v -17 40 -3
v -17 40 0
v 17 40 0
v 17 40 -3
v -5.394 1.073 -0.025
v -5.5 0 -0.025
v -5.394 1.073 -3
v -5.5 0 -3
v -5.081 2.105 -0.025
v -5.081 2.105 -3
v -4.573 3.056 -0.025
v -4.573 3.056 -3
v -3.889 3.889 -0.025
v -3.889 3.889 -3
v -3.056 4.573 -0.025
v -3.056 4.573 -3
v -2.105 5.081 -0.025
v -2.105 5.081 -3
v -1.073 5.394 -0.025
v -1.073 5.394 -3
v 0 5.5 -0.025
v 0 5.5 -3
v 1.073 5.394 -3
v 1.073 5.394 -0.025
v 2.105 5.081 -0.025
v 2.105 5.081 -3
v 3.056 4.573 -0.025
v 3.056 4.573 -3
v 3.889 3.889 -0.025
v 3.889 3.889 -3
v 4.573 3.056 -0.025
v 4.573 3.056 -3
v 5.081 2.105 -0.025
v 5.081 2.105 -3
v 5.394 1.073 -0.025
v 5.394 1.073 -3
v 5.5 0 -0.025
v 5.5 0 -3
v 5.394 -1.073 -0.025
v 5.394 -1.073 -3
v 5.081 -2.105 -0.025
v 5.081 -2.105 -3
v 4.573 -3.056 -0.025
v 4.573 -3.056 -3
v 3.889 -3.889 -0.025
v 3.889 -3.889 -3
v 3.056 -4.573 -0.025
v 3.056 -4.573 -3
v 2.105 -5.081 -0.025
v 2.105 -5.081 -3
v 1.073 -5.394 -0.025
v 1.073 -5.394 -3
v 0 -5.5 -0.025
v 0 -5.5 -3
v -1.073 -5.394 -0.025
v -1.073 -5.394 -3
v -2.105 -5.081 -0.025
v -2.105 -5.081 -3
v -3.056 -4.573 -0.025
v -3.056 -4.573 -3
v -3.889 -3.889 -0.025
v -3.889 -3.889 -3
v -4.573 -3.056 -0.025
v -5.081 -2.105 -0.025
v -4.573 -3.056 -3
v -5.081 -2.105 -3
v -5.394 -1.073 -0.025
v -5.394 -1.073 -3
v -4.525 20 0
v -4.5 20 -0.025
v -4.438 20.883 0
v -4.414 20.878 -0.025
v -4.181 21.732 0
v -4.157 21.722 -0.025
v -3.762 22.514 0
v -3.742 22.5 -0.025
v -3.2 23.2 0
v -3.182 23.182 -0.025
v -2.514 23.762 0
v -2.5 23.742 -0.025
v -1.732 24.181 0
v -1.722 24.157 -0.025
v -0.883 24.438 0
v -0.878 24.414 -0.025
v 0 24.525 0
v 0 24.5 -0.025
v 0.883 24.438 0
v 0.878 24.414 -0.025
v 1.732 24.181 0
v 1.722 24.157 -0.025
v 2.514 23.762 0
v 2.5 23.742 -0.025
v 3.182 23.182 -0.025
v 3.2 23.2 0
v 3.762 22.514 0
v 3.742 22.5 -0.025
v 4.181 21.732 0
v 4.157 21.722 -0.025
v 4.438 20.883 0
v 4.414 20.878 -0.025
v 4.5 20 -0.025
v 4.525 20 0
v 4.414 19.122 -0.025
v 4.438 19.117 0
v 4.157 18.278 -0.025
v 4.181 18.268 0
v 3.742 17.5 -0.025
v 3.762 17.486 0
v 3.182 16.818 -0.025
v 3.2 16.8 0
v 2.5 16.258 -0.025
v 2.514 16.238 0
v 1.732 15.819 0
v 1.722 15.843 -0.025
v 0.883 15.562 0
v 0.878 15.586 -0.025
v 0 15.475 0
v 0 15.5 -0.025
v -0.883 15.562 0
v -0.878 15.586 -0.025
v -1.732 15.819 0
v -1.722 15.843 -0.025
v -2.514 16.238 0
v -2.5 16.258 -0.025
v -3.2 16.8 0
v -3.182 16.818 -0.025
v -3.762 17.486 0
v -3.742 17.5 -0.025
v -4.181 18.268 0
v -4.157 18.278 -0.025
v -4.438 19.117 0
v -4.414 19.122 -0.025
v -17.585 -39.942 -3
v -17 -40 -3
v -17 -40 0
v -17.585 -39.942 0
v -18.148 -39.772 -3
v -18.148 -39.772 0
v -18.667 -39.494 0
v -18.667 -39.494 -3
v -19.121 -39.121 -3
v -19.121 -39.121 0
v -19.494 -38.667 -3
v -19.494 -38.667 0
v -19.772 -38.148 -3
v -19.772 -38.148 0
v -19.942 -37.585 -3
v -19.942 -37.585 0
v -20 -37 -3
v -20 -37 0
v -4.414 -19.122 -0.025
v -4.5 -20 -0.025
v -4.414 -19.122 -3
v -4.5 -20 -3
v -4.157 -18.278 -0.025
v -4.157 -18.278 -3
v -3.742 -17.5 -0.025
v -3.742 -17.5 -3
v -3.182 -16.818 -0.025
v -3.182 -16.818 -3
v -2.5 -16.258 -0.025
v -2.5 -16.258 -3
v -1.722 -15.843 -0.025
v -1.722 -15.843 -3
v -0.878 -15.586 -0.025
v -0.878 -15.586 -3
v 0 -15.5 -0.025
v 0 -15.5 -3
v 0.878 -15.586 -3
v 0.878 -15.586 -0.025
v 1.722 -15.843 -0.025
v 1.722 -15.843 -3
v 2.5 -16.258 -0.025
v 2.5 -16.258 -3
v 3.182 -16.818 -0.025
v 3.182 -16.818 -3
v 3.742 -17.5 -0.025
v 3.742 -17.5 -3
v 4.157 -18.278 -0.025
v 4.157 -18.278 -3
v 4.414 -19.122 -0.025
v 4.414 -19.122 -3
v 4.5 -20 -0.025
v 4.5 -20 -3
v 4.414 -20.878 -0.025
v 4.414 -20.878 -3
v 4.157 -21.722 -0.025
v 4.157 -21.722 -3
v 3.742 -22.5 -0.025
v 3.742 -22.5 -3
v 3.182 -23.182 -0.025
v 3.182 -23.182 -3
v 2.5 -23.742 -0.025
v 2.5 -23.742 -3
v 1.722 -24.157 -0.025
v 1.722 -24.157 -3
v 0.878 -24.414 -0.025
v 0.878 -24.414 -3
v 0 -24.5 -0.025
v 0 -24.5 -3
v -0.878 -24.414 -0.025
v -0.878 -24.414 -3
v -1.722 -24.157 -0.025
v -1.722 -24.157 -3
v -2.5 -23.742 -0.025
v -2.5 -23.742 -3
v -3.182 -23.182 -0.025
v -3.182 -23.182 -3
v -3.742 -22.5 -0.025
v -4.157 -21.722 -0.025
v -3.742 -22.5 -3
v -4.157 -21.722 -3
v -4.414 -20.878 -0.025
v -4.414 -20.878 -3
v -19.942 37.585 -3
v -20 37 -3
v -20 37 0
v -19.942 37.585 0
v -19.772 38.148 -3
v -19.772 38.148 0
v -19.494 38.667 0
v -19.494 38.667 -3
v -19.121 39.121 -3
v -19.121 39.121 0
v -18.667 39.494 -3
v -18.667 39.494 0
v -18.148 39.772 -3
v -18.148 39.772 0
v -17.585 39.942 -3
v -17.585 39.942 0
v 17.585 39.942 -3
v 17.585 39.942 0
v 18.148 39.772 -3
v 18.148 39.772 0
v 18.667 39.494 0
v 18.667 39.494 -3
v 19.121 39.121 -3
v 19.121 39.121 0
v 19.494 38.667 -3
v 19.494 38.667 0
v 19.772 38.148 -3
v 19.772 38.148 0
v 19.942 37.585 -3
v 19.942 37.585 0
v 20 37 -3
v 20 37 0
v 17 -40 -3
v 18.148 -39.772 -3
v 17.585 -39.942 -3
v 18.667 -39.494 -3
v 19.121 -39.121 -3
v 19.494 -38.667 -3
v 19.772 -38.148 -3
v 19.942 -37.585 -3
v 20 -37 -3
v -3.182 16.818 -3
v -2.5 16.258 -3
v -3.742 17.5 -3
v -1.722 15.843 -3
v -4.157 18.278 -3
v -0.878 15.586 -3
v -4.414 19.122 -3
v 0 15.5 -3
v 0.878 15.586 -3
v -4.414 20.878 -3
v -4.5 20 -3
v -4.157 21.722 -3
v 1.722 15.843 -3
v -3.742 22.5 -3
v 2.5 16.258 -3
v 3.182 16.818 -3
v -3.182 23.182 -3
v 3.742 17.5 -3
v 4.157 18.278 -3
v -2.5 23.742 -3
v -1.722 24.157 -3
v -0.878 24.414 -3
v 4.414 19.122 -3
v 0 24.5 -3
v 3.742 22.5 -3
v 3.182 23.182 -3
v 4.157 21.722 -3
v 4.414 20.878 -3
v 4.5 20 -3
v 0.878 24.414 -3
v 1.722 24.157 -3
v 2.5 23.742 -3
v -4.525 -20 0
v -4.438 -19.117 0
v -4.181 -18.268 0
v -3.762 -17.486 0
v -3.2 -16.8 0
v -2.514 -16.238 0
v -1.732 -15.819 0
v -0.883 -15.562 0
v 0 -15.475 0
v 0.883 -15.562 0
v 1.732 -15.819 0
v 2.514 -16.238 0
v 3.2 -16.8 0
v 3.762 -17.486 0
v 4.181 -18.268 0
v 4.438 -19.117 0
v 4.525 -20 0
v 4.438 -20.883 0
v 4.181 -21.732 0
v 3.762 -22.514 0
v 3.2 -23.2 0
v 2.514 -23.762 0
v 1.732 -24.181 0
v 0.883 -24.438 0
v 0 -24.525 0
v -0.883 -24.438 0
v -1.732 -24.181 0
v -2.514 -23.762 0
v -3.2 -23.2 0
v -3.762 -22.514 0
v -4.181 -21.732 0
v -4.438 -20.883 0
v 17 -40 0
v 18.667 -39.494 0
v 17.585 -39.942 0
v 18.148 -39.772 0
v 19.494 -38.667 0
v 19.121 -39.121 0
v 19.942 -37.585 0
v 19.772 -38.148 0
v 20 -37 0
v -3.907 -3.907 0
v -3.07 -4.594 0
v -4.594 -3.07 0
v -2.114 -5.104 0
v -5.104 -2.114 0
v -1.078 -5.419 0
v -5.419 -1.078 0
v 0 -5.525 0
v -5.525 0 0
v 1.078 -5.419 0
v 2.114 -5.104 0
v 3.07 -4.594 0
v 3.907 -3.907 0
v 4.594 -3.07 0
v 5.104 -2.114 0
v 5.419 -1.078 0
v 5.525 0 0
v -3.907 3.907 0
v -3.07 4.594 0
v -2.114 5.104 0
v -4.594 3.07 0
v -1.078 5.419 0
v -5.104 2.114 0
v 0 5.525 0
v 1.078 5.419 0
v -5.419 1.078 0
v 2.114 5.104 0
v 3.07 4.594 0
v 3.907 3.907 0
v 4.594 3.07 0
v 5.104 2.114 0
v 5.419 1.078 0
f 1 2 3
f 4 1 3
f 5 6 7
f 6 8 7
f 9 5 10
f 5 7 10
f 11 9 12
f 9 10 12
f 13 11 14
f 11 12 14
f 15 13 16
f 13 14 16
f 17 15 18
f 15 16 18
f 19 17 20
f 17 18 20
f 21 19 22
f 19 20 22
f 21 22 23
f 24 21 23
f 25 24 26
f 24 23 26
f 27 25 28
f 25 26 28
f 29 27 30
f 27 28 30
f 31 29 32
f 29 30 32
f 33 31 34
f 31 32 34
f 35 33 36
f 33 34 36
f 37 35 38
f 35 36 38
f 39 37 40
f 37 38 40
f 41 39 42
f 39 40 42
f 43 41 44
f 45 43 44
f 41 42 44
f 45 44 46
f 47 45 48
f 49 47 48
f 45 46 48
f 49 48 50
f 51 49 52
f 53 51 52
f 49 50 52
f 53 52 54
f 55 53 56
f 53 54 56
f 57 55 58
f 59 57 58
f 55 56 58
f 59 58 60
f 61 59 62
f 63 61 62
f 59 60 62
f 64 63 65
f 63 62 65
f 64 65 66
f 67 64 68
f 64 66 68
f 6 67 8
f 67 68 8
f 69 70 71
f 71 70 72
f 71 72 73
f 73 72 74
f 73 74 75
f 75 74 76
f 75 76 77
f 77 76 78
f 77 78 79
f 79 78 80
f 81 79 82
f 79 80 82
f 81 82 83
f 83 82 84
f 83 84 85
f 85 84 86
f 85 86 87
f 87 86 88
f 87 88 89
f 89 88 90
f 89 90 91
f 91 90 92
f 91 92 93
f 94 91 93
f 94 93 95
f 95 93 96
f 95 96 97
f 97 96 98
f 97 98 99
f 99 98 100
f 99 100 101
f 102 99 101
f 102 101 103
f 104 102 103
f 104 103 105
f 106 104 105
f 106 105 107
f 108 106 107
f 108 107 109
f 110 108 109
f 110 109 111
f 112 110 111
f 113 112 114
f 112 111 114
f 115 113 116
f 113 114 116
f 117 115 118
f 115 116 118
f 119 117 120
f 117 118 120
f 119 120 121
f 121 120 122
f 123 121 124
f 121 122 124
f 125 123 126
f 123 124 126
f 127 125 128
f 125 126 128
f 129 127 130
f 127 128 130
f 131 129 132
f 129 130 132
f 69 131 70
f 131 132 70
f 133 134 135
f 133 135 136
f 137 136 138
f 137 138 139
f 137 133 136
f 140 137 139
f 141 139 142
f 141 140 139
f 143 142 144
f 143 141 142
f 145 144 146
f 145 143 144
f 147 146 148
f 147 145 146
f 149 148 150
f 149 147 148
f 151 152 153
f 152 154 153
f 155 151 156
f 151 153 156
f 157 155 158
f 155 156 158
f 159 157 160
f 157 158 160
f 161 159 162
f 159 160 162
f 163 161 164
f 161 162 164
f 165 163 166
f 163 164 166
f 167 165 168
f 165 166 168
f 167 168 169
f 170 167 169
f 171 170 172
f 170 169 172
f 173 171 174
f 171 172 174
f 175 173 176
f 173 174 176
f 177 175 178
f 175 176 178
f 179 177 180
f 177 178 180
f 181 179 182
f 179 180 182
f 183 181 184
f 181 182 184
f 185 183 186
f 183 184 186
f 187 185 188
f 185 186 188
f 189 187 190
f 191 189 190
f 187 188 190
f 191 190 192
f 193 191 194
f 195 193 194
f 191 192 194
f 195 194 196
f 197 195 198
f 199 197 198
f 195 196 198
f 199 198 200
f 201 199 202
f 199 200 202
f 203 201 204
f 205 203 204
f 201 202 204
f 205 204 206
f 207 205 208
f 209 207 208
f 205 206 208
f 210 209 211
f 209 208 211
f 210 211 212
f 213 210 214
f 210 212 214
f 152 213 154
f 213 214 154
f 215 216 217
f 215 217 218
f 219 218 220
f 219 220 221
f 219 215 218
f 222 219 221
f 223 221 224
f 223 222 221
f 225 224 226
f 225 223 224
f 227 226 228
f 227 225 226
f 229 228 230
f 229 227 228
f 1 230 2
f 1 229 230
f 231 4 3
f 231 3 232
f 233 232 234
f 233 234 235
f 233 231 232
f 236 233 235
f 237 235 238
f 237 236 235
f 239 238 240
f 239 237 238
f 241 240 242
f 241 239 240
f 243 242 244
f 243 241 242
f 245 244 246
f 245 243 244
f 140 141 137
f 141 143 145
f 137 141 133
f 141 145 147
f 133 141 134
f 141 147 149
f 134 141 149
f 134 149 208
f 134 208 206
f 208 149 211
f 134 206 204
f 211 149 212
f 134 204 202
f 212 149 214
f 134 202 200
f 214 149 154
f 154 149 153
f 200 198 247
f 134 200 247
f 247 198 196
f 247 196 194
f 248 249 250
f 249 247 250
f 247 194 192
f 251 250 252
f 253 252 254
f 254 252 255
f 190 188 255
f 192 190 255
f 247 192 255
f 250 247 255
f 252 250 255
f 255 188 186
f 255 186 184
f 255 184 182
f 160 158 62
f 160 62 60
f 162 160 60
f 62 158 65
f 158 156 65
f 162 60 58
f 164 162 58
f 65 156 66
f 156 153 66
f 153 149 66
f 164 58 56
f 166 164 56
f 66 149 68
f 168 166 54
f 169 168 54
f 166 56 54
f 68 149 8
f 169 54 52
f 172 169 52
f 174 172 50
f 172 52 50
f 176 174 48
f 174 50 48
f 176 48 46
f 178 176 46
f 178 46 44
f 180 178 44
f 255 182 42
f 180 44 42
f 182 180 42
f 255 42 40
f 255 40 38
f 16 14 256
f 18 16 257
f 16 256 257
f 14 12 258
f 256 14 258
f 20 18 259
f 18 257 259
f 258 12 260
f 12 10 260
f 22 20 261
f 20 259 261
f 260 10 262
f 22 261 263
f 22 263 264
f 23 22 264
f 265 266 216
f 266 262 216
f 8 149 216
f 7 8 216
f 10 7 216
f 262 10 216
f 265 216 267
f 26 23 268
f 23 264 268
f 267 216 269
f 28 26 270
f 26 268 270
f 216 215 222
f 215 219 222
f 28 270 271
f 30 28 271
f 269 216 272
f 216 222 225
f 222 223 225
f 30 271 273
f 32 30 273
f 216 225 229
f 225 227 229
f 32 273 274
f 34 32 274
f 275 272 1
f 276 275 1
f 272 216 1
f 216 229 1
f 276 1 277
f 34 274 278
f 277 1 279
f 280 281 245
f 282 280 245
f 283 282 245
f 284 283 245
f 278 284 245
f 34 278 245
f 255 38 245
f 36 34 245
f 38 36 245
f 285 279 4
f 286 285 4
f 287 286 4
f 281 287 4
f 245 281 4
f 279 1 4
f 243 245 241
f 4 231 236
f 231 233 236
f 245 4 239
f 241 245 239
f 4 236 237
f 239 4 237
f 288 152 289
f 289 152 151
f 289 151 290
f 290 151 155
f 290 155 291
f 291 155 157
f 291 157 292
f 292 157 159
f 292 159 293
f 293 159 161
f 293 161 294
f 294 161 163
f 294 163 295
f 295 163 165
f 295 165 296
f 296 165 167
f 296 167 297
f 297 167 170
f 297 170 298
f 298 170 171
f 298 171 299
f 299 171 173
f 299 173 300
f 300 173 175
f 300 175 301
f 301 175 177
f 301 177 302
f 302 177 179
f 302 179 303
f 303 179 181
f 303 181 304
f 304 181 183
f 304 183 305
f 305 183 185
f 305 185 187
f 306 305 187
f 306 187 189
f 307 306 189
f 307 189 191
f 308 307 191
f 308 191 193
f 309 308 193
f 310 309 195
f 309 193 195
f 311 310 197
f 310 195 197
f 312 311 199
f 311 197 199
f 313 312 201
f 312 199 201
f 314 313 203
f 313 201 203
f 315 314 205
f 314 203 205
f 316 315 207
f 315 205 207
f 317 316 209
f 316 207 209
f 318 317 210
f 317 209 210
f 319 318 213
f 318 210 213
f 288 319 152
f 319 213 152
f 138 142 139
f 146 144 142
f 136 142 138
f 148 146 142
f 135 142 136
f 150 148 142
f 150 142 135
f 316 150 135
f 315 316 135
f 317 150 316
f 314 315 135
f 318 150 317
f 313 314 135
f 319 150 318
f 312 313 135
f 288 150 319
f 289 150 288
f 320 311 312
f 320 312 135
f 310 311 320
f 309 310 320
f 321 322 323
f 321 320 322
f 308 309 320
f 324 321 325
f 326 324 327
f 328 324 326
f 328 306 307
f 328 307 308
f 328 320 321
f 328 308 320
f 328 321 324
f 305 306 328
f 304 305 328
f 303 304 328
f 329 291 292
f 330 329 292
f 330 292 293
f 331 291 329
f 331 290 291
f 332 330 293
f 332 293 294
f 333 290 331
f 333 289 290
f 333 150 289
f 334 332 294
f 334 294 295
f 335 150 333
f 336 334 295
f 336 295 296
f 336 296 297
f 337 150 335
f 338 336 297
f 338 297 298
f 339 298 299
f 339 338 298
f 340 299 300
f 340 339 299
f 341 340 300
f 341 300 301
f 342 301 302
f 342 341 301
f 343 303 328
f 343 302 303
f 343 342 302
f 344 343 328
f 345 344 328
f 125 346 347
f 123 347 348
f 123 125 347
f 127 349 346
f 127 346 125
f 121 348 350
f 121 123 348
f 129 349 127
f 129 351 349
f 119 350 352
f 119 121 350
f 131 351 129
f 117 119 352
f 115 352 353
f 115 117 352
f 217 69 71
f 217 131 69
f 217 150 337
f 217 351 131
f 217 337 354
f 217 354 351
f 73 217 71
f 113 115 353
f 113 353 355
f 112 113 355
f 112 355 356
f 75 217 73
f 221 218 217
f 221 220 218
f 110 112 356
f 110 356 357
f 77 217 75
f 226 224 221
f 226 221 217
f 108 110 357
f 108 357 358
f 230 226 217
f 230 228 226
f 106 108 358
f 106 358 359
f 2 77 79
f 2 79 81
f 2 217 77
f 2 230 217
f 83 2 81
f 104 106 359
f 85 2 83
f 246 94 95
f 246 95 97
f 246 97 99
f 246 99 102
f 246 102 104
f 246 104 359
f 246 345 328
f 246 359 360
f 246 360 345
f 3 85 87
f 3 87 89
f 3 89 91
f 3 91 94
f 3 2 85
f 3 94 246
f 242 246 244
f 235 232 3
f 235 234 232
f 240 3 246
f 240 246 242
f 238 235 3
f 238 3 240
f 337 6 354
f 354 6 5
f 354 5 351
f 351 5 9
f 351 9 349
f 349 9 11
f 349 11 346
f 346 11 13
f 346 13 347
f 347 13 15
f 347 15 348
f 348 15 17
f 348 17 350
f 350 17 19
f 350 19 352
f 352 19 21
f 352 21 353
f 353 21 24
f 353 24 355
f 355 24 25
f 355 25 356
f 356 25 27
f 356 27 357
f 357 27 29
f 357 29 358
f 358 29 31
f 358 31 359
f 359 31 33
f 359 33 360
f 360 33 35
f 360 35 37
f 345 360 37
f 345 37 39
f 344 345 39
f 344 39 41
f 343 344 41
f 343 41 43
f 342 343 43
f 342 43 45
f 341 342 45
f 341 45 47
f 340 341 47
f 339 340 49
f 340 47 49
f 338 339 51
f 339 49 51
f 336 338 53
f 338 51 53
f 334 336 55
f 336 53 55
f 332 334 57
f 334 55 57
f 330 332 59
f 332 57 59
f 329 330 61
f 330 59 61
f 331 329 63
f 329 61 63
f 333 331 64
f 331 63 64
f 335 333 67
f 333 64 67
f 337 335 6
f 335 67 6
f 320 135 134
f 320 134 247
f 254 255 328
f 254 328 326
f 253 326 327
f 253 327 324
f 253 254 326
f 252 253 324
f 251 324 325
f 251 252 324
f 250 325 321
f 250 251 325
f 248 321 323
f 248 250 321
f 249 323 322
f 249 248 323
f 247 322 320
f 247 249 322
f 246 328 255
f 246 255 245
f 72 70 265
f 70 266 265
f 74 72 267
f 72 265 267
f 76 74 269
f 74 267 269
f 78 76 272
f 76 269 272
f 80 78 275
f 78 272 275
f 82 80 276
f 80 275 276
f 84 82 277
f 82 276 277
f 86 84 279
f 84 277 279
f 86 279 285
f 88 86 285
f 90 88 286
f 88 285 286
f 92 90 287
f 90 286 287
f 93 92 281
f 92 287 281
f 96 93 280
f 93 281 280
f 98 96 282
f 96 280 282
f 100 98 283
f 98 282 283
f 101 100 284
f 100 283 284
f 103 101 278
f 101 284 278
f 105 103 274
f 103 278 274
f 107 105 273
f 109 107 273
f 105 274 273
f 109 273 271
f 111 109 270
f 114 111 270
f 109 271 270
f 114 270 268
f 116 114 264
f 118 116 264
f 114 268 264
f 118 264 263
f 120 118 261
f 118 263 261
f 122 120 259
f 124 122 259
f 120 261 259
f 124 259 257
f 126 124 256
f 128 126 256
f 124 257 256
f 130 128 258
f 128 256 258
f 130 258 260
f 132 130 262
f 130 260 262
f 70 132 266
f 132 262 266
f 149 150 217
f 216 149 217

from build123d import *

# Parameters (mm, degrees)
SKETCH_1_W                    = 40
SKETCH_1_H                    = 80
SM_BASE_FLANGE_1_DEPTH        = 3
OTHER_START                   = -3
OTHER_1_DEPTH                 = 3
HOLE_WIZARD_M8_1_D            = 9
HOLE_WIZARD_M8_1_DEPTH        = 12.4
HOLE_WIZARD_M8_1_CSINK_D      = 9.05
HOLE_WIZARD_M8_1_CSINK_ANGLE  = 90
HOLE_WIZARD_M8_1_TIP          = 2.703872786
HOLE_WIZARD_M10_1_D           = 11
HOLE_WIZARD_M10_1_DEPTH       = 12.4
HOLE_WIZARD_M10_1_CSINK_D     = 11.05
HOLE_WIZARD_M10_1_CSINK_ANGLE = 90
HOLE_WIZARD_M10_1_TIP         = 3.304733405


# Read off the part's stored shape, not the designer's step: 断开-边角1
# Sheet-metal steps are written as plain solids
with BuildPart() as part:
    # Sketch 1 → 基体-法兰1 (new body)
    with BuildSketch(Plane.XY):
        Rectangle(SKETCH_1_W, SKETCH_1_H)
    extrude(amount=-SM_BASE_FLANGE_1_DEPTH)

    # Other 1 outline → Other 1 (cut)
    with BuildSketch(Plane.XY.offset(OTHER_START)):
        with BuildLine():
            ThreePointArc((20, -37), (19.121320344, -39.121320344), (17, -40))
            Line((17, -40), (20, -40))
            Line((20, -40), (20, -37))
        make_face()
        with BuildLine():
            Line((-20, -40), (-17, -40))
            ThreePointArc((-17, -40), (-19.121320344, -39.121320344), (-20, -37))
            Line((-20, -37), (-20, -40))
        make_face()
        with BuildLine():
            ThreePointArc((17, 40), (19.121320344, 39.121320344), (20, 37))
            Line((20, 37), (20, 40))
            Line((20, 40), (17, 40))
        make_face()
        with BuildLine():
            Line((-20, 40), (-20, 37))
            ThreePointArc((-20, 37), (-19.121320344, 39.121320344), (-17, 40))
            Line((-17, 40), (-20, 40))
        make_face()
    extrude(amount=OTHER_1_DEPTH, mode=Mode.SUBTRACT)

    # M8 间隙孔1
    with Locations(Plane.XY):
        with Locations((0, 20), (0, -20)):
            CounterSinkHole(HOLE_WIZARD_M8_1_D / 2, HOLE_WIZARD_M8_1_CSINK_D / 2, depth=HOLE_WIZARD_M8_1_DEPTH, counter_sink_angle=HOLE_WIZARD_M8_1_CSINK_ANGLE)
            with Locations((0, 0, -(HOLE_WIZARD_M8_1_DEPTH + HOLE_WIZARD_M8_1_TIP / 2))):  # 118° drill point
                Cone(0, HOLE_WIZARD_M8_1_D / 2, HOLE_WIZARD_M8_1_TIP, mode=Mode.SUBTRACT)

    # M10 间隙孔1
    with Locations(Plane.XY):
        with Locations((0, 0)):
            CounterSinkHole(HOLE_WIZARD_M10_1_D / 2, HOLE_WIZARD_M10_1_CSINK_D / 2, depth=HOLE_WIZARD_M10_1_DEPTH, counter_sink_angle=HOLE_WIZARD_M10_1_CSINK_ANGLE)
            with Locations((0, 0, -(HOLE_WIZARD_M10_1_DEPTH + HOLE_WIZARD_M10_1_TIP / 2))):  # 118° drill point
                Cone(0, HOLE_WIZARD_M10_1_D / 2, HOLE_WIZARD_M10_1_TIP, mode=Mode.SUBTRACT)


solid = part.part
